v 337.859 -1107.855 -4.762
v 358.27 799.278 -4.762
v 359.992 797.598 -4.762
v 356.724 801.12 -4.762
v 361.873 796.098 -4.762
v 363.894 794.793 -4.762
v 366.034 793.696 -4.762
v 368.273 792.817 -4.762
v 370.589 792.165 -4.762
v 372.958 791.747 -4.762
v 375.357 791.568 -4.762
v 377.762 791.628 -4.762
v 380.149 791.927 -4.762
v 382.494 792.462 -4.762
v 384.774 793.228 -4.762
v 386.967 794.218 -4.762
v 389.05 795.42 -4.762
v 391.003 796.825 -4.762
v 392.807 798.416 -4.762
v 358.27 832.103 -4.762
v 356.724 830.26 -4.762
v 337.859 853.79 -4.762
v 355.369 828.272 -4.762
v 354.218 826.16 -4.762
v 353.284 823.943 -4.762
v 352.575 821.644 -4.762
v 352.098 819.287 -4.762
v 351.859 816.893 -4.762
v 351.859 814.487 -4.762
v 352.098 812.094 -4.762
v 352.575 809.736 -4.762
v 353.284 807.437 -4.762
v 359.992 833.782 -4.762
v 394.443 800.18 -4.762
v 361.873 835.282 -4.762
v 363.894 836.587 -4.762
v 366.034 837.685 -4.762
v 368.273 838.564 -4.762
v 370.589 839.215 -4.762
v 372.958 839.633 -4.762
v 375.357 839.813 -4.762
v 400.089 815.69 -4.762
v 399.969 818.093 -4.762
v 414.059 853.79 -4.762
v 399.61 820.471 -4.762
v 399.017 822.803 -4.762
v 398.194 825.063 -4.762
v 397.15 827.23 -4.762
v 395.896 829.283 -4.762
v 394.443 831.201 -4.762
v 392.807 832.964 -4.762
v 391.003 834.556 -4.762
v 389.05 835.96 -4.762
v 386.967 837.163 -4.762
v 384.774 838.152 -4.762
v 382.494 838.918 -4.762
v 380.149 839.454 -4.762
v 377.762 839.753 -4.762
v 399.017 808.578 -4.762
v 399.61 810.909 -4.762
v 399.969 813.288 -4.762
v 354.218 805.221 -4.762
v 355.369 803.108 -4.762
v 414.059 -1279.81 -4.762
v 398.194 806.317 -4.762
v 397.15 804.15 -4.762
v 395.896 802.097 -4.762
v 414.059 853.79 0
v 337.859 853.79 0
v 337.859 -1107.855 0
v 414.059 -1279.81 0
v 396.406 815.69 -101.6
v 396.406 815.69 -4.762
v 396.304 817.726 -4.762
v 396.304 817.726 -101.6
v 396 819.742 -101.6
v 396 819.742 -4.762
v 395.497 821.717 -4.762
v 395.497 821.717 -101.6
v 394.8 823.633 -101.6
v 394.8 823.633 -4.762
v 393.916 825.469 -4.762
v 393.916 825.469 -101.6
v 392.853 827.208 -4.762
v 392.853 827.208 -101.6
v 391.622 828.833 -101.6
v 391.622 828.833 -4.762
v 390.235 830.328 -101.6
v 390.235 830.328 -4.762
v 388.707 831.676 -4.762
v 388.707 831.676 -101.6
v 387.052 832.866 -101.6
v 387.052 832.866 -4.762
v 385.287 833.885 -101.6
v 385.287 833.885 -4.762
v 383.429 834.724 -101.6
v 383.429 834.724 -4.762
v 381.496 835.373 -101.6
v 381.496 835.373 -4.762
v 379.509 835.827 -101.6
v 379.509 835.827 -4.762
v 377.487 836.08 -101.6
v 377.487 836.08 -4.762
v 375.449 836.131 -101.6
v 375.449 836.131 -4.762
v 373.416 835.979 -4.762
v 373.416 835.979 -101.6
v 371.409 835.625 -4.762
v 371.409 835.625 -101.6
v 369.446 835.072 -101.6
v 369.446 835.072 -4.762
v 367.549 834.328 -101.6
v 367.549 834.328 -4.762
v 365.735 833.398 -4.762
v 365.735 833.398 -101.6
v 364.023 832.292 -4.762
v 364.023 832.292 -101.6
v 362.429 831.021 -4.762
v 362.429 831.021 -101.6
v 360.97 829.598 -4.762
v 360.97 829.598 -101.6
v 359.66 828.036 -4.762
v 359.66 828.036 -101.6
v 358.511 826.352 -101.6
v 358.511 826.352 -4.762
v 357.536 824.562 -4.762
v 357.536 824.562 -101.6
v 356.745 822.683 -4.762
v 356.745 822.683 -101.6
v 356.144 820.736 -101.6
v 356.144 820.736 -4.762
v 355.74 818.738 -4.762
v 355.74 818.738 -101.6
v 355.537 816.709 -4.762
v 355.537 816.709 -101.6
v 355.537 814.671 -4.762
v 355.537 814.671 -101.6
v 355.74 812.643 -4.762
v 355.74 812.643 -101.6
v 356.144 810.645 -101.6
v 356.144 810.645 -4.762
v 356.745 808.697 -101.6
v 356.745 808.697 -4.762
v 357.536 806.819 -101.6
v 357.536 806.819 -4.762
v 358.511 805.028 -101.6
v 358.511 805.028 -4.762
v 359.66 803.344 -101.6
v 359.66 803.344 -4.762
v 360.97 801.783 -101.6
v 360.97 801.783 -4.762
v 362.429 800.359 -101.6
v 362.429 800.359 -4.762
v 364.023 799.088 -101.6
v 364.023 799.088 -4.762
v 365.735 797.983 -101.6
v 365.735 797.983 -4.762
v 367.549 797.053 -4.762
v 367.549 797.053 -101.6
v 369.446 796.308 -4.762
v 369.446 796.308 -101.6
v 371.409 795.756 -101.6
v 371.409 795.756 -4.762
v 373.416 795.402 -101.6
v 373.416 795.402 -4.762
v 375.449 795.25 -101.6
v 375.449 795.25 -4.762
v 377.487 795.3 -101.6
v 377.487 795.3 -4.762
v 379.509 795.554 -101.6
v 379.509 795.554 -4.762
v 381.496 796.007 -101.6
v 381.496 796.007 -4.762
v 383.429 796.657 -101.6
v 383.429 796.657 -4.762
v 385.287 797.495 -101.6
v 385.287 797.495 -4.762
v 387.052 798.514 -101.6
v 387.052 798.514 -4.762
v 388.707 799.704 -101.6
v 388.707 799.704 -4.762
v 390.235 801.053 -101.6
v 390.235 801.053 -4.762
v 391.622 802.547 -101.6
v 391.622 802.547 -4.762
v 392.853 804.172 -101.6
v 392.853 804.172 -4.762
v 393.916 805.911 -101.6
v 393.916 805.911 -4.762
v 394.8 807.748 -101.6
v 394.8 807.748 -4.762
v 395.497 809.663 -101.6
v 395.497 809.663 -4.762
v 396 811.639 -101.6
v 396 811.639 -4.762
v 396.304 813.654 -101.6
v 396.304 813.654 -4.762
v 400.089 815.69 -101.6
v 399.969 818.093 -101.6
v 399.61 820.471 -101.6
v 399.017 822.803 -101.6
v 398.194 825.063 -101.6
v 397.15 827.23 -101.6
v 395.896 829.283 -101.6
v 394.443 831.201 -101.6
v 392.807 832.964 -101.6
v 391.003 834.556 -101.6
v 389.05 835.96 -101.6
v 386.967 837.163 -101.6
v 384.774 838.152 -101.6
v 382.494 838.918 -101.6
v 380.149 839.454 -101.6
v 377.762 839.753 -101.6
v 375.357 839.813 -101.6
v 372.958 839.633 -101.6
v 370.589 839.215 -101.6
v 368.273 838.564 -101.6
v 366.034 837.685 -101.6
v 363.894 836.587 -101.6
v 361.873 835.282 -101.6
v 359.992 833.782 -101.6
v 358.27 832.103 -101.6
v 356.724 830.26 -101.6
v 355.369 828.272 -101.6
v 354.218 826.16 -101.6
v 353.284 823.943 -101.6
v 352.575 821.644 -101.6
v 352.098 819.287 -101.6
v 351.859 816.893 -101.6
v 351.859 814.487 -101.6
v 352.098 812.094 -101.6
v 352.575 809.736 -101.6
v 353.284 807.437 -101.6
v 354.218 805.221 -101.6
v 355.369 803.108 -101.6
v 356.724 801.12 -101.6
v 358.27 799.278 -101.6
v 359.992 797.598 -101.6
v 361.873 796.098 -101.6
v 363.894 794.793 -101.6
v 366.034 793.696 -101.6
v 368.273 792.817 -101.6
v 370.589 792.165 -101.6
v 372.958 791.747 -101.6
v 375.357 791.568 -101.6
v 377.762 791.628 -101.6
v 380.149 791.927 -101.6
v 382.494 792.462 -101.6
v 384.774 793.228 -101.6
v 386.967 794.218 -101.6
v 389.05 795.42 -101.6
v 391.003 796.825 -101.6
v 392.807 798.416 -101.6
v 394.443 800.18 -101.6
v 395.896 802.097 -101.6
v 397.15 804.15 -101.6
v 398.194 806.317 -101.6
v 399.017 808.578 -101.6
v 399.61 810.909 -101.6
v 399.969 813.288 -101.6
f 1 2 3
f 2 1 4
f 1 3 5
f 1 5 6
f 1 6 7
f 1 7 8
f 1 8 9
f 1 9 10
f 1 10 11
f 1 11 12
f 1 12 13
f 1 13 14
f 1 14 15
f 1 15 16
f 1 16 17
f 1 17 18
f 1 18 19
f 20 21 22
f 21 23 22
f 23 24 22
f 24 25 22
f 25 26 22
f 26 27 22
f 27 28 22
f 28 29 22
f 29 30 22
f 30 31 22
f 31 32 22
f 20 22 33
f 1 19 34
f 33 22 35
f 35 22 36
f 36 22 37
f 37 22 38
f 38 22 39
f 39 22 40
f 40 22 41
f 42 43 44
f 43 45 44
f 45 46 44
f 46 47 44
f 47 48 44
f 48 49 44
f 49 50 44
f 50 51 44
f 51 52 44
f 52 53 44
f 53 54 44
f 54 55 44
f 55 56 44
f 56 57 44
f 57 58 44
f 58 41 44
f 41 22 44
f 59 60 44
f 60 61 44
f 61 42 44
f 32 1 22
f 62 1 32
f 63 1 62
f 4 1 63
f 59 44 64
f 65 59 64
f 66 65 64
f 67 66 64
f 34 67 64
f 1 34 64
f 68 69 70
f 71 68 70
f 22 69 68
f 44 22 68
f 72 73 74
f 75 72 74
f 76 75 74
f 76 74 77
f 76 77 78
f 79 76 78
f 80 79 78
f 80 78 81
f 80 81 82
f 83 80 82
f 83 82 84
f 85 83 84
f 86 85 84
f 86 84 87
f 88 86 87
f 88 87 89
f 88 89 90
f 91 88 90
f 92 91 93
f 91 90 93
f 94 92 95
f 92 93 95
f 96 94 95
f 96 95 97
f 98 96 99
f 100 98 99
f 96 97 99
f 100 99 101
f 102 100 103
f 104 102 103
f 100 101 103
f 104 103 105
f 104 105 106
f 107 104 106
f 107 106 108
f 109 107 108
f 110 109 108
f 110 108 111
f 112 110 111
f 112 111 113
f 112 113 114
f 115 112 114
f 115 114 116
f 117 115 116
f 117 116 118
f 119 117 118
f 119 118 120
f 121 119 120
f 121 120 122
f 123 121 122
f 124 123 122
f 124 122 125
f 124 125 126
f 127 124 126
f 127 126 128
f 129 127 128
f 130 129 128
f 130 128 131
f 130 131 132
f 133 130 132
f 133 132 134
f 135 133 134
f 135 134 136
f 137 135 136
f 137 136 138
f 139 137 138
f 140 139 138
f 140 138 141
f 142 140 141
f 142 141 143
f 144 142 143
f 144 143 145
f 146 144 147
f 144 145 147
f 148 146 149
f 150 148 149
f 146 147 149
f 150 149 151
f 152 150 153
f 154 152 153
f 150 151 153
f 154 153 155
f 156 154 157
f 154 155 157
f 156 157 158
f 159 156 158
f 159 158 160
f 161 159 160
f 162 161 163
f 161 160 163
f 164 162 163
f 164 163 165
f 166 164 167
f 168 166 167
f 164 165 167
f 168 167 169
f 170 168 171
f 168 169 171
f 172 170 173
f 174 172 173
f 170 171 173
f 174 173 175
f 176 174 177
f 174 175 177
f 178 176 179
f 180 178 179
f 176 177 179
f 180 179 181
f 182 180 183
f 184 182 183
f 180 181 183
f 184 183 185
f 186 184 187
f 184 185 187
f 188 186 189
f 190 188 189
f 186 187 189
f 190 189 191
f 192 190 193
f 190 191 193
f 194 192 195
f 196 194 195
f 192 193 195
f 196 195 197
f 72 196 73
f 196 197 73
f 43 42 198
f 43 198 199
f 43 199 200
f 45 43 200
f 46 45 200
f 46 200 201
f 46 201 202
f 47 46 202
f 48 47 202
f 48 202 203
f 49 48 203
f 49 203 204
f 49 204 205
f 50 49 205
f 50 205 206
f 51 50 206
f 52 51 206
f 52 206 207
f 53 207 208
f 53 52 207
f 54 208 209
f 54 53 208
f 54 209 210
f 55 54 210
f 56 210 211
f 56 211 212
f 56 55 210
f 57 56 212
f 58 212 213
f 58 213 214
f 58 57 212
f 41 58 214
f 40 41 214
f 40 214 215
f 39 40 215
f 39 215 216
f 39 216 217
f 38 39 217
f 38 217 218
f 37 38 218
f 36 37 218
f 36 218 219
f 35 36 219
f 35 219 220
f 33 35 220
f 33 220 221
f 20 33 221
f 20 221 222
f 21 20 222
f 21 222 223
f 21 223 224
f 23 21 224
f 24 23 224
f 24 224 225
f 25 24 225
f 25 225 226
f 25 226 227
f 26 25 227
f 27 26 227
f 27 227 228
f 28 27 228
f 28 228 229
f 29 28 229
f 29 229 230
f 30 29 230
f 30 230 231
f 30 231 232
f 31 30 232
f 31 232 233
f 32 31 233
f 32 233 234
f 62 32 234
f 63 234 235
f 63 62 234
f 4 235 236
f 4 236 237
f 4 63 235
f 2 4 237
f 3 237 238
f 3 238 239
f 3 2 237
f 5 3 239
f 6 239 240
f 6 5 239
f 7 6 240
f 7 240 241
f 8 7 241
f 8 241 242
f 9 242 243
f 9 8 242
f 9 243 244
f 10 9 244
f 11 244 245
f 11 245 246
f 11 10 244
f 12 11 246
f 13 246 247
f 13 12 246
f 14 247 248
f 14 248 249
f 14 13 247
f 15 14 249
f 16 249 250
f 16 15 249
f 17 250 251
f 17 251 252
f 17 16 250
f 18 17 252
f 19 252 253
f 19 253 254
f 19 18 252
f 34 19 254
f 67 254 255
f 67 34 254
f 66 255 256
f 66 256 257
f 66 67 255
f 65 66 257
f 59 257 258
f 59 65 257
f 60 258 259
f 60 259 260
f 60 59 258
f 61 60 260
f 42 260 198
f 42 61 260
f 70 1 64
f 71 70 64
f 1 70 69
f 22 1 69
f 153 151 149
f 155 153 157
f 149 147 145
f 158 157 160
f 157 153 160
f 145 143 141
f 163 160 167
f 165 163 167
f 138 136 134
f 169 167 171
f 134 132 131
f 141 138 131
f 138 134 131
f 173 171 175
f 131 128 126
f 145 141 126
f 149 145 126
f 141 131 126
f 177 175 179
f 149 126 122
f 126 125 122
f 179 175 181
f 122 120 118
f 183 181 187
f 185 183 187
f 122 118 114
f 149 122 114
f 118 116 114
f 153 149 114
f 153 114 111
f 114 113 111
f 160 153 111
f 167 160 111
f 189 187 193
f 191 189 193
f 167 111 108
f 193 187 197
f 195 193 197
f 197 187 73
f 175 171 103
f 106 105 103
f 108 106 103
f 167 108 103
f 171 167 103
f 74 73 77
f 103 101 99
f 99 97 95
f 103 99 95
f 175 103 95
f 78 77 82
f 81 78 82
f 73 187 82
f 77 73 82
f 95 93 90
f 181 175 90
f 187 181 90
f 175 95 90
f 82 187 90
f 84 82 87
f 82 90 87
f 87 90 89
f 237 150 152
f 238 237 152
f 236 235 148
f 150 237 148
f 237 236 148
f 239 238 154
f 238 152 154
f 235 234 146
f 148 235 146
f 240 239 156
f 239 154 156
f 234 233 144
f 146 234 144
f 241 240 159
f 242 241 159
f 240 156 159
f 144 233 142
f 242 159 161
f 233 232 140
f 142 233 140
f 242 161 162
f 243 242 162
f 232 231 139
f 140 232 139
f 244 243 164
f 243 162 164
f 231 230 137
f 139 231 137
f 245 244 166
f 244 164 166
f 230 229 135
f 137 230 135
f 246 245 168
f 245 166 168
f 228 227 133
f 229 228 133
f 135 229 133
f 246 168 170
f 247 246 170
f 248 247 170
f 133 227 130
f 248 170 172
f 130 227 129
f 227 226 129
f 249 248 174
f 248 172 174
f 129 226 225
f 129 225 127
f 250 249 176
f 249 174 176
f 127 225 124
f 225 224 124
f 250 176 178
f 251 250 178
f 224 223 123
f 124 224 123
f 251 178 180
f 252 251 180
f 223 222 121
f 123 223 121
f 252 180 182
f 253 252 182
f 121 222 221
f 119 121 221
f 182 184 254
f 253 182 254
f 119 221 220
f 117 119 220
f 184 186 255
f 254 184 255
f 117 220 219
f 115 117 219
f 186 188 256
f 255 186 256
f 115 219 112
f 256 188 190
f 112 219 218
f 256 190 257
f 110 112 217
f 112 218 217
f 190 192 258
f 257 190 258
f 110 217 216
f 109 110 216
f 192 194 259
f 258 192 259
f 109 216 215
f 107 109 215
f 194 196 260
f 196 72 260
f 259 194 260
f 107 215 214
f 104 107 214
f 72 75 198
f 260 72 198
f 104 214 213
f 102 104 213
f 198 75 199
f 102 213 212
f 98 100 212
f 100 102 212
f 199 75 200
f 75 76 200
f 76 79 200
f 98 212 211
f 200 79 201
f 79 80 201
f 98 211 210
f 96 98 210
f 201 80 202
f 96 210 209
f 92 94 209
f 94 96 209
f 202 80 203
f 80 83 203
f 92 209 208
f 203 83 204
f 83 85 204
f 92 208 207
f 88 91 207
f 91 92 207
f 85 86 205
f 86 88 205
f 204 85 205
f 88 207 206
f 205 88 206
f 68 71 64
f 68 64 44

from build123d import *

# Parameters (mm, degrees)
F0_W     = 76.2
F0_H     = 2133.6
F1_DEPTH = 4.7625
F2_R     = 24.13
F2_R_2   = 20.447
F3_DEPTH = 101.6
F5_DEPTH = 35.814


with BuildPart() as f1:
    # F0 (on Top) → F1 (new body)
    with BuildSketch(Plane.XY):
        with Locations((375.958569, -213.009804)):
            Rectangle(F0_W, F0_H)
    extrude(amount=-F1_DEPTH)

    # F2 (on face) → F3 (join)
    with BuildSketch(Plane.XY):
        with Locations((375.958569, 815.690196)):
            Circle(F2_R)
        with Locations((375.958569, 815.690196)):
            Circle(F2_R_2, mode=Mode.SUBTRACT)
    extrude(amount=-F3_DEPTH)

    # F4 (on face) → F5 (cut)
    with BuildSketch(Plane(origin=(0, 0, -4.7625), x_dir=(1, 0, 0), z_dir=(0, 0, -1))):
        Polygon((337.858569, 1107.854731), (414.058569, 1279.809804), (337.858569, 1279.809804), align=None)
    extrude(amount=-F5_DEPTH, mode=Mode.SUBTRACT)


solid = f1.part
